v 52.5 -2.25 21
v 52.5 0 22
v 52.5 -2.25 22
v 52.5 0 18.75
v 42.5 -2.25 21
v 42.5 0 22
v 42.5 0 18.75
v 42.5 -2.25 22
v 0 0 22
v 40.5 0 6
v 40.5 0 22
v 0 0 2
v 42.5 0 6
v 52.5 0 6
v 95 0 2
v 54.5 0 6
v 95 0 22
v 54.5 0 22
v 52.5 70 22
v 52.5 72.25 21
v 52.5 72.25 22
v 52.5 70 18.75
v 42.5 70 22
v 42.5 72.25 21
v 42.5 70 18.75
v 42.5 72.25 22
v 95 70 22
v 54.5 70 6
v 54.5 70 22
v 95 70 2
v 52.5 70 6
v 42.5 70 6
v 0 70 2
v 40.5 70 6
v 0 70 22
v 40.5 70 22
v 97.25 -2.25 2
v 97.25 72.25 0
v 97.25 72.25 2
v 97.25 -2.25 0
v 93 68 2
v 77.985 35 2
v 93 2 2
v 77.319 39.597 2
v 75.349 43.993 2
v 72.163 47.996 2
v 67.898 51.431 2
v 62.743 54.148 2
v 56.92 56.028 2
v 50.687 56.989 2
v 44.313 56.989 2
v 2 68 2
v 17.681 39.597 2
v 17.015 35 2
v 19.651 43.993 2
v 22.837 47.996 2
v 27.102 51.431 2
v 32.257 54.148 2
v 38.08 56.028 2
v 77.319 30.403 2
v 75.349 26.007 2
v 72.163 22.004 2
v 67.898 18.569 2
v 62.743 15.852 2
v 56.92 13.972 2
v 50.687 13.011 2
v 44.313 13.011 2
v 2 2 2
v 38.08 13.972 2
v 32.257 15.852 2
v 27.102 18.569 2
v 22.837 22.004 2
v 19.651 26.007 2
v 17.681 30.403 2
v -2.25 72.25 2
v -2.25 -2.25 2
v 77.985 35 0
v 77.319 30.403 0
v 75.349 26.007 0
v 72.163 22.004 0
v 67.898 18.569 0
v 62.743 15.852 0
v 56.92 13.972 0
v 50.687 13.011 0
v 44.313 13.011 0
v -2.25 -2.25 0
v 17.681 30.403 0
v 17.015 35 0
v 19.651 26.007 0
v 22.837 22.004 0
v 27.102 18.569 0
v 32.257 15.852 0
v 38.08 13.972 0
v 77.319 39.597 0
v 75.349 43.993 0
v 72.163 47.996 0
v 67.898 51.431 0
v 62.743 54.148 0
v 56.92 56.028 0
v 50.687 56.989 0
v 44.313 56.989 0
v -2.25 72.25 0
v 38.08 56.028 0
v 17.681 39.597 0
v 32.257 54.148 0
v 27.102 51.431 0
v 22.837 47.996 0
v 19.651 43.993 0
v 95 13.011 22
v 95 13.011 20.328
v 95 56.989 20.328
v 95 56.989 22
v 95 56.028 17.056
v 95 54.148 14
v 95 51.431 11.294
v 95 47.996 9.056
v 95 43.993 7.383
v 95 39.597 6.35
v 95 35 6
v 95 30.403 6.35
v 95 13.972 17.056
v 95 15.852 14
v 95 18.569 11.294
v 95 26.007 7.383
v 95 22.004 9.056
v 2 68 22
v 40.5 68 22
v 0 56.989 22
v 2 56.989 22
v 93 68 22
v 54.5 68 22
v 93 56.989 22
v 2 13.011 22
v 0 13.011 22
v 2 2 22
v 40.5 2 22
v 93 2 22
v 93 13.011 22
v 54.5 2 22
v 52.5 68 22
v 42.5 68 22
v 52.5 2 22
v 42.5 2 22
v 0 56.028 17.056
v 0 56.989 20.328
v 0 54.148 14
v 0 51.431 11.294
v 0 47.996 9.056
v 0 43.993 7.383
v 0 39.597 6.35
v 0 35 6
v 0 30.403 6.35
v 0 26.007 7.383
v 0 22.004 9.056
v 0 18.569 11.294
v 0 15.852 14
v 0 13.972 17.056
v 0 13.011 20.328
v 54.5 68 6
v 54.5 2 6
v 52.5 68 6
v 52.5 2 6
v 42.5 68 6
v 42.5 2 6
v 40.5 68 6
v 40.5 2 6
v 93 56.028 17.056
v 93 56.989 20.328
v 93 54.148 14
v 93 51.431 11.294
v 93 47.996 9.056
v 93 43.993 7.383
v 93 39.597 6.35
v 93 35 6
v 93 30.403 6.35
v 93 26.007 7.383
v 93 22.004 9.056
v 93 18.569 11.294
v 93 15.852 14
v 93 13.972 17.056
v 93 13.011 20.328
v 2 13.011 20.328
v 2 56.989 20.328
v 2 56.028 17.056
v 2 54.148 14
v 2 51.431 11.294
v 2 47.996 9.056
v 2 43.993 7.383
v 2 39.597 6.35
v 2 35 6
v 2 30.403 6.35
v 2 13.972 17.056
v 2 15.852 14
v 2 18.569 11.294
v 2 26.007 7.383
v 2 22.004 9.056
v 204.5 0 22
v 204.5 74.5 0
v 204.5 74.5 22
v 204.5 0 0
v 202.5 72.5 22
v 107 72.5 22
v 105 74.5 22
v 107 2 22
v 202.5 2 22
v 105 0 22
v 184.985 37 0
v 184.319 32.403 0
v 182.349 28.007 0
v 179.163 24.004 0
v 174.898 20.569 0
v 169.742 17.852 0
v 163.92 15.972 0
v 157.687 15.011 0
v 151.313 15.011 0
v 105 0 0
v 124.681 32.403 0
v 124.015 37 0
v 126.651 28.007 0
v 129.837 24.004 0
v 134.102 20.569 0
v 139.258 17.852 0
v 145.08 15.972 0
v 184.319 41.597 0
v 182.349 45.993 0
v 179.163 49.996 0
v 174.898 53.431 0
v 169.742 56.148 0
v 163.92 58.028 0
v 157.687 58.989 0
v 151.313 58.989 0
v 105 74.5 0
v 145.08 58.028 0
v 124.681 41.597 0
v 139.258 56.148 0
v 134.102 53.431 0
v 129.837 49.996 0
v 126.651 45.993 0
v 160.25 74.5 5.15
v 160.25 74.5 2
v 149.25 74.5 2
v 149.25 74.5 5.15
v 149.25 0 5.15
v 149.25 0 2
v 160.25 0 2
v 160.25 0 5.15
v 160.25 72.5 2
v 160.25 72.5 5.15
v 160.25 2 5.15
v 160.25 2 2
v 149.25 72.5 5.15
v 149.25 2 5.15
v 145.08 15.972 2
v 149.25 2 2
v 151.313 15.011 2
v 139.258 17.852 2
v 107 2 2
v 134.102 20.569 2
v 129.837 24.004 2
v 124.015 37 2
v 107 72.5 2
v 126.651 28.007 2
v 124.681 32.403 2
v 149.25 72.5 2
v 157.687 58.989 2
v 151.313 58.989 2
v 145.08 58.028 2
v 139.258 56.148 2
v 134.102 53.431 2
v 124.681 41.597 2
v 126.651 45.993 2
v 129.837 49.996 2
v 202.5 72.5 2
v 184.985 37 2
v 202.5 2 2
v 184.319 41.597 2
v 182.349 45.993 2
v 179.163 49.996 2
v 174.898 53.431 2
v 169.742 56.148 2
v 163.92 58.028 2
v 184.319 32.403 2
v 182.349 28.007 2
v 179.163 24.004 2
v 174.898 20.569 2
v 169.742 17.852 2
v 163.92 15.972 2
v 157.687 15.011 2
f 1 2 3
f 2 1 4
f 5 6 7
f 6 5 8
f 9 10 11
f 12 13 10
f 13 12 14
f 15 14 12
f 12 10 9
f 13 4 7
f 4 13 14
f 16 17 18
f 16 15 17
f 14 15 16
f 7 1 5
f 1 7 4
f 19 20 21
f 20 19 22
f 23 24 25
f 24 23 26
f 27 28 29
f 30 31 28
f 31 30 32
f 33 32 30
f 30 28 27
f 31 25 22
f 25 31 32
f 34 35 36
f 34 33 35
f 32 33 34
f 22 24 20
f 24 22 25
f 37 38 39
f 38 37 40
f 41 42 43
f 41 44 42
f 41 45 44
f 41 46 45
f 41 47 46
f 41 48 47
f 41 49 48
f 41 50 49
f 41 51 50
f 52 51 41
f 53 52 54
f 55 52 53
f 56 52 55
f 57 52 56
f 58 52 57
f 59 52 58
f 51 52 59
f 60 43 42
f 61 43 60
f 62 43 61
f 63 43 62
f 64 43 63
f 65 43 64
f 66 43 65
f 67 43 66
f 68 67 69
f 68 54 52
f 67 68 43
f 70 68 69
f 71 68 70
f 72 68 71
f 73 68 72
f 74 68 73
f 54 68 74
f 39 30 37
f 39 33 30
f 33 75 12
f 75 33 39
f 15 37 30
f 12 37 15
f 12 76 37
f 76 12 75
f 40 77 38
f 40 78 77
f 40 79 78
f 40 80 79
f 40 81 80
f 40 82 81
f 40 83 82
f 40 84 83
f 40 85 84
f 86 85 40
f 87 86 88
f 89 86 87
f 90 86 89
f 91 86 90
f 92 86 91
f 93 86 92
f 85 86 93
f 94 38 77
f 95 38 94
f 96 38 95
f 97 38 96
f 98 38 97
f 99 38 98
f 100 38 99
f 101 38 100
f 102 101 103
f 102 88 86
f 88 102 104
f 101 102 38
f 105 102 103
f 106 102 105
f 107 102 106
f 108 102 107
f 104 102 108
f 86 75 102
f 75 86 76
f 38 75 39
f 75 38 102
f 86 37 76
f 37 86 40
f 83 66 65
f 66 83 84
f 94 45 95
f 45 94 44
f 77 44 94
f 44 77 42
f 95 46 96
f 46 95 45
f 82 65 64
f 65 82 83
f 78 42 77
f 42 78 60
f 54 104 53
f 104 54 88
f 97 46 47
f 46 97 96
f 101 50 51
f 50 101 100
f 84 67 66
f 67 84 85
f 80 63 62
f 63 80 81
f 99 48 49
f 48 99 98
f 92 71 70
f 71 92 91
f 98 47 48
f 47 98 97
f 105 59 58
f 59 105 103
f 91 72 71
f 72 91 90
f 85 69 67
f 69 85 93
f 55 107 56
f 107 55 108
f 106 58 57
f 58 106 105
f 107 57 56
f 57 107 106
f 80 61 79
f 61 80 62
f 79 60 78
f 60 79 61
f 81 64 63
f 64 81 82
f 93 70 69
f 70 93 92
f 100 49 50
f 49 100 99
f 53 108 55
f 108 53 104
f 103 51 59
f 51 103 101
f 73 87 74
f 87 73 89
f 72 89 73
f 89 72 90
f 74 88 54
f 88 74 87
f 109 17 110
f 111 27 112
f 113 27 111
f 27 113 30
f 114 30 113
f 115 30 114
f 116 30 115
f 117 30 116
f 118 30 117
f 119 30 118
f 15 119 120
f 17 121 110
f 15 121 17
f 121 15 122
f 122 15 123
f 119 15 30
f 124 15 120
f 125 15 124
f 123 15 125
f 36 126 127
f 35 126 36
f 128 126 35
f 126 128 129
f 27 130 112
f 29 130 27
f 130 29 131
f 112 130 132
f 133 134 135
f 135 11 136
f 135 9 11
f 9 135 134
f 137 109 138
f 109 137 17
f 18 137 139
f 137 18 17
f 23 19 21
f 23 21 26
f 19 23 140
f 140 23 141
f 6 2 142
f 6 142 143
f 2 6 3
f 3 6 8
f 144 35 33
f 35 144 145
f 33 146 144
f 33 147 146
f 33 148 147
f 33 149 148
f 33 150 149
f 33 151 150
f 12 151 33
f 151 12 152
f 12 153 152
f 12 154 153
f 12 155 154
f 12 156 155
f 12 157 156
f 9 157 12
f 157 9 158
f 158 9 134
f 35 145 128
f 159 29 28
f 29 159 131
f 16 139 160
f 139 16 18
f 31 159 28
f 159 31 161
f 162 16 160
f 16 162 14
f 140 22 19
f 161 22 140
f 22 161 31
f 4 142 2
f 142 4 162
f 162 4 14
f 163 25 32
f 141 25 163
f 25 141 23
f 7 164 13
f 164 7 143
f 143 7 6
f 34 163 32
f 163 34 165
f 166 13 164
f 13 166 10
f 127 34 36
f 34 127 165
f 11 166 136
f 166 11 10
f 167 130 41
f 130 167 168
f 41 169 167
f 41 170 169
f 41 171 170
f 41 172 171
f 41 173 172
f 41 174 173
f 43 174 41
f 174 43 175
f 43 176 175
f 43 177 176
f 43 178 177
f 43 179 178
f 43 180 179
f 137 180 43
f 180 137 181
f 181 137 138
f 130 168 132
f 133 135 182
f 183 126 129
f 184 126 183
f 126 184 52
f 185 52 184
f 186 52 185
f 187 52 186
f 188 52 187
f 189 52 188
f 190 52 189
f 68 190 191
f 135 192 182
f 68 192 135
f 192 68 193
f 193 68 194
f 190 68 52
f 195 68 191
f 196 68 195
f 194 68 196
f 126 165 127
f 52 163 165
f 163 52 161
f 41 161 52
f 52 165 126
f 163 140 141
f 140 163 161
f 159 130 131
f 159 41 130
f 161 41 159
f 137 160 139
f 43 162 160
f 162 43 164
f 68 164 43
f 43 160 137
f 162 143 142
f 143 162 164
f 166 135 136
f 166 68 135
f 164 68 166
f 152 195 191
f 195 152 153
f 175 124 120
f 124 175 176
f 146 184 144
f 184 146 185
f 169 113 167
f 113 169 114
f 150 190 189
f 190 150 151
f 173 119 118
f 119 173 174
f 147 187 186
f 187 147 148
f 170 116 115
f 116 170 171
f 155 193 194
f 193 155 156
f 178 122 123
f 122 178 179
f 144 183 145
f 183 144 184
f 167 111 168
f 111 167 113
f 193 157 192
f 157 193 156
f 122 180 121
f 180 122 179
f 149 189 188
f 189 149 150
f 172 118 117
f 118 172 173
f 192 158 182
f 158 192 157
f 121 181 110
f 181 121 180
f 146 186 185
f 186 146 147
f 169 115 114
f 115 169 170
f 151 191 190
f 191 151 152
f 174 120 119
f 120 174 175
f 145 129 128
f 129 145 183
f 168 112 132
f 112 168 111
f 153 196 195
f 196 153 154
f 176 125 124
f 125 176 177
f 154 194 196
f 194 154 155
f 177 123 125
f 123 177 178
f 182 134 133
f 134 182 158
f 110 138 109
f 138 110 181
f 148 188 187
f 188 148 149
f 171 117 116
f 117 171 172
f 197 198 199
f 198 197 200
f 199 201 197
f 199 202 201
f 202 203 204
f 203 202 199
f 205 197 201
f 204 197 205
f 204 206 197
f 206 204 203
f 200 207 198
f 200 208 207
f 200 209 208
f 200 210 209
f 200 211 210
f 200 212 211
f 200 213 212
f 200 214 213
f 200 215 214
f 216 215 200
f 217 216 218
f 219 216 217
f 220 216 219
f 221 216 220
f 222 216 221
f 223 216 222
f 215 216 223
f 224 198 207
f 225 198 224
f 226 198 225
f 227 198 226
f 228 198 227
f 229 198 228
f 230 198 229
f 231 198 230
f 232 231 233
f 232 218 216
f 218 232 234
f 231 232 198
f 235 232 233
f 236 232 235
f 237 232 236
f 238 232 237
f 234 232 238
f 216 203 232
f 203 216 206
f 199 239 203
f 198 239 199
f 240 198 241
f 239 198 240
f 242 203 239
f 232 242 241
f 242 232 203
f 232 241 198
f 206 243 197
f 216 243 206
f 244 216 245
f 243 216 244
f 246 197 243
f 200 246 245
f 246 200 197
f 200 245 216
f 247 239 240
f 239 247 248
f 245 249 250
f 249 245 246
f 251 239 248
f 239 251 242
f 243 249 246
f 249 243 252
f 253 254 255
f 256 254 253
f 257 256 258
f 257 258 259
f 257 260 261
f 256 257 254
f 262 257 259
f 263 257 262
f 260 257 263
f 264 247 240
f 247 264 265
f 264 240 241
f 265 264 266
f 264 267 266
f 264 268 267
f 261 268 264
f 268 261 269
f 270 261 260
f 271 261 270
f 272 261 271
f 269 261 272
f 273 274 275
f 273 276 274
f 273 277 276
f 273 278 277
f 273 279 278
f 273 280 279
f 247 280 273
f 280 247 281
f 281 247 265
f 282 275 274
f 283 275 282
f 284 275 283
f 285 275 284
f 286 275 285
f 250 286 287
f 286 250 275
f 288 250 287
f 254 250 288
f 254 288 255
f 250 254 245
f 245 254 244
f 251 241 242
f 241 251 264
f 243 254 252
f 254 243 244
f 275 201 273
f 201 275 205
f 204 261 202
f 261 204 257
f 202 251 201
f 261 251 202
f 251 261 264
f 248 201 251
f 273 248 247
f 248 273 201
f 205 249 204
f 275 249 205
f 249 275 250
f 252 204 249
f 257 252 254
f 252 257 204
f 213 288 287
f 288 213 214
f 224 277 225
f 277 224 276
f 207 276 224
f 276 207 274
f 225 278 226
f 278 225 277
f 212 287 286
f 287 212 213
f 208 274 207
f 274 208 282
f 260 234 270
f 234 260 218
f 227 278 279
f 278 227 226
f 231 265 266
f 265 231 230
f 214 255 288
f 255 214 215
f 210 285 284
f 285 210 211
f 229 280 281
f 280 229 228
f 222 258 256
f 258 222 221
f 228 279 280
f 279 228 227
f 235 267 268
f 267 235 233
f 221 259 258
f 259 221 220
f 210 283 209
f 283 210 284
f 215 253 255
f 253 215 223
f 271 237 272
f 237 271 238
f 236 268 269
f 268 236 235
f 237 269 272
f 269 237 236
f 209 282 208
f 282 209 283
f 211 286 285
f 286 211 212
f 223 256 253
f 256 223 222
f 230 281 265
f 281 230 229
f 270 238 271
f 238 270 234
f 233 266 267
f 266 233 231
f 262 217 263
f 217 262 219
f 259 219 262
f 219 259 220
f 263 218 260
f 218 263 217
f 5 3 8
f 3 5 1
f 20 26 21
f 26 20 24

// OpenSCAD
CARD_SIZE_LONG_EDGE =91;
CARD_SIZE_SHORT_EDGE = 66;
CARD_STACK_HEIGHT = 20;
WALL_THICKNESS = 2;
TAB_THICKNESS = 10;
EXTRA_SPACE = .25;
// rounded cutouts remove a "circle" from the bottom surface, and a 1/2 "circle" from each short end of the bottom piece
/* [Cutouts] */
// Percent of card deck height to cutout
END_CUTOUT_HEIGHT_PERCENTAGE = 80; // [0:100]
// Percent of box width to cutout
END_CUTOUT_WIDTH_PERCENTAGE  = 67; // [0:100]
// Percent of box width to cutout
BOTTOM_CUTOUT_WIDTH_PERCENTAGE = 67; // [0:100]
// percent of box length to cutout
BOTTOM_CUTOUT_LENGTH_PERCENTAGE = 67; // [0:100]
// preview[view:south west, tilt:top diagonal]


CARD_LONG_EDGE = CARD_SIZE_LONG_EDGE + (WALL_THICKNESS*2);
CARD_SHORT_EDGE = CARD_SIZE_SHORT_EDGE + (WALL_THICKNESS*2);
ALL_EXTRA_SPACE = (EXTRA_SPACE *2);

LID_OUTSIDE_LONG_THICKNESS = CARD_LONG_EDGE + (WALL_THICKNESS*2);
LID_OUTSIDE_SHORT_THICKNESS = CARD_SHORT_EDGE + (WALL_THICKNESS*2);

SPACE_BETWEEN_BOTTOM_AND_LID = LID_OUTSIDE_LONG_THICKNESS + (WALL_THICKNESS*2)+ 2;

HEIGHT = CARD_STACK_HEIGHT + WALL_THICKNESS;

// rounded cut-outs
// ends
END_CUTOUT_LENGTH = CARD_LONG_EDGE + 2;
END_CUTOUT_RADIUS = CARD_STACK_HEIGHT * END_CUTOUT_HEIGHT_PERCENTAGE/100;
END_CUTOUT_WIDTH  = CARD_SIZE_SHORT_EDGE * END_CUTOUT_WIDTH_PERCENTAGE/100;
// since we'll be scaling our cylinder, we really need the ratio to scale by for the longer dimension, not the direct dimension itself
END_CUTOUT_WIDTH_RATIO = END_CUTOUT_WIDTH / (END_CUTOUT_RADIUS*2);
// bottom
BOTTOM_CUTOUT_LENGTH = (WALL_THICKNESS * 2)+ 2;
BOTTOM_CUTOUT_RADIUS = CARD_SIZE_SHORT_EDGE * BOTTOM_CUTOUT_WIDTH_PERCENTAGE / 2 /100;
BOTTOM_CUTOUT_HEIGHT = CARD_SIZE_LONG_EDGE * BOTTOM_CUTOUT_LENGTH_PERCENTAGE/100;
// since we'll be scaling our cylinder, we really need the ratio to scale by for the longer dimension, not the direct dimension itself
BOTTOM_CUTOUT_HEIGHT_RATIO = BOTTOM_CUTOUT_HEIGHT / (BOTTOM_CUTOUT_RADIUS*2);


	//*Start Bottom of Box

					//*Start wedge 1
translate ([((CARD_LONG_EDGE/2) -(TAB_THICKNESS/2)),-WALL_THICKNESS-EXTRA_SPACE,HEIGHT-WALL_THICKNESS-1-EXTRA_SPACE]) 

difference (){
cube ([TAB_THICKNESS,WALL_THICKNESS+EXTRA_SPACE,WALL_THICKNESS+EXTRA_SPACE]);
translate ([0, WALL_THICKNESS+(EXTRA_SPACE),0]) rotate ([135,0,0])  

cube ([(TAB_THICKNESS+3), sqrt(((WALL_THICKNESS+EXTRA_SPACE)*(WALL_THICKNESS+EXTRA_SPACE))+((WALL_THICKNESS+EXTRA_SPACE)*(WALL_THICKNESS+EXTRA_SPACE))), sqrt(((WALL_THICKNESS+EXTRA_SPACE)*(WALL_THICKNESS+EXTRA_SPACE))+((WALL_THICKNESS+EXTRA_SPACE)*(WALL_THICKNESS+EXTRA_SPACE)))]);

}
			//*end wedge 1


			//*Start wedge 2
translate ([((CARD_LONG_EDGE/2) - (TAB_THICKNESS/2)),CARD_SHORT_EDGE,HEIGHT-WALL_THICKNESS-1-EXTRA_SPACE])

 difference (){
cube ([TAB_THICKNESS,WALL_THICKNESS+EXTRA_SPACE,WALL_THICKNESS+EXTRA_SPACE]);

translate ([0 ,0 ,0]) rotate ([-45,0,0])  cube ([(TAB_THICKNESS+3),sqrt(((WALL_THICKNESS+EXTRA_SPACE)*(WALL_THICKNESS+EXTRA_SPACE))+((WALL_THICKNESS+EXTRA_SPACE)*(WALL_THICKNESS+EXTRA_SPACE))),sqrt(((WALL_THICKNESS+EXTRA_SPACE)*(WALL_THICKNESS+EXTRA_SPACE))+((WALL_THICKNESS+EXTRA_SPACE)*(WALL_THICKNESS+EXTRA_SPACE)))]);
}
			//*end wedge 2


translate ([((CARD_LONG_EDGE/2) -(TAB_THICKNESS/2)),-WALL_THICKNESS-EXTRA_SPACE,HEIGHT-1])  cube ([TAB_THICKNESS, WALL_THICKNESS+EXTRA_SPACE, 1]); 					//*Tab

translate ([((CARD_LONG_EDGE/2) -(TAB_THICKNESS/2)),CARD_SHORT_EDGE,HEIGHT-1])  cube ([TAB_THICKNESS, WALL_THICKNESS+EXTRA_SPACE, 1]);				//*Tab

difference()
{
	translate ([-WALL_THICKNESS-EXTRA_SPACE, -WALL_THICKNESS-EXTRA_SPACE, 0 ]) cube ([CARD_LONG_EDGE + (WALL_THICKNESS*2)+ALL_EXTRA_SPACE, CARD_SHORT_EDGE + (WALL_THICKNESS*2)+ALL_EXTRA_SPACE, WALL_THICKNESS]);  						//*Bottom Plate

	translate([CARD_LONG_EDGE/2,CARD_SHORT_EDGE/2,-WALL_THICKNESS]) scale([BOTTOM_CUTOUT_HEIGHT_RATIO,1,1]) cylinder(h=BOTTOM_CUTOUT_LENGTH,r=BOTTOM_CUTOUT_RADIUS);  //*Bottom cutout to cut through bottom plate
}

difference() 
{
	cube ([CARD_LONG_EDGE,CARD_SHORT_EDGE,HEIGHT]);		//*Main Body

	translate([ ((CARD_LONG_EDGE / 2) + (TAB_THICKNESS/2)), -.5, ((HEIGHT+ WALL_THICKNESS) / 4) ]) cube ([2, CARD_SHORT_EDGE + 2, HEIGHT]);	//*Tab cutout
	
	translate([ ((CARD_LONG_EDGE / 2) - ((TAB_THICKNESS/2)+2)), -.5, ((HEIGHT+ WALL_THICKNESS)/ 4) ]) cube ([2, CARD_SHORT_EDGE + 2, HEIGHT ]);  //*Tab cutout

	translate([WALL_THICKNESS,WALL_THICKNESS,WALL_THICKNESS]) cube ([CARD_LONG_EDGE - (WALL_THICKNESS*2),CARD_SHORT_EDGE - (WALL_THICKNESS*2),HEIGHT]);			//*Hole

    translate([-WALL_THICKNESS/2,CARD_SHORT_EDGE/2,HEIGHT]) scale([1,END_CUTOUT_WIDTH_RATIO,1]) rotate([0,90,0]) cylinder(h=END_CUTOUT_LENGTH,r=END_CUTOUT_RADIUS);  //*End cutout
	translate([CARD_LONG_EDGE/2,CARD_SHORT_EDGE/2,-WALL_THICKNESS]) scale([BOTTOM_CUTOUT_HEIGHT_RATIO,1,1]) cylinder(h=BOTTOM_CUTOUT_LENGTH,r=BOTTOM_CUTOUT_RADIUS);  //*Bottom cutout to cut through main box
}
			//*End Bottom of Box



			//*Start Top of Box


translate ([SPACE_BETWEEN_BOTTOM_AND_LID, 0, 0]) 


difference() 
{
	cube ([LID_OUTSIDE_LONG_THICKNESS+ALL_EXTRA_SPACE, LID_OUTSIDE_SHORT_THICKNESS+ALL_EXTRA_SPACE, HEIGHT]); 		//*Top Main Body


	translate([ ((LID_OUTSIDE_LONG_THICKNESS+ALL_EXTRA_SPACE) / 2)-((TAB_THICKNESS+1)/2), -.5, WALL_THICKNESS]) 
cube ([(TAB_THICKNESS+1), LID_OUTSIDE_SHORT_THICKNESS + 2, WALL_THICKNESS+1.15 ]); 	//*Tab Hole

	translate([WALL_THICKNESS,WALL_THICKNESS, WALL_THICKNESS]) 
cube ([LID_OUTSIDE_LONG_THICKNESS - (WALL_THICKNESS*2)+ALL_EXTRA_SPACE,LID_OUTSIDE_SHORT_THICKNESS - (WALL_THICKNESS*2)+ALL_EXTRA_SPACE,HEIGHT]);		//*Hole
translate([LID_OUTSIDE_LONG_THICKNESS/2,LID_OUTSIDE_SHORT_THICKNESS/2,-WALL_THICKNESS]) scale([BOTTOM_CUTOUT_HEIGHT_RATIO,1,1]) cylinder(h=BOTTOM_CUTOUT_LENGTH,r=BOTTOM_CUTOUT_RADIUS);  //*Bottom cutout to cut through main box
}

			//* End Top of Box
